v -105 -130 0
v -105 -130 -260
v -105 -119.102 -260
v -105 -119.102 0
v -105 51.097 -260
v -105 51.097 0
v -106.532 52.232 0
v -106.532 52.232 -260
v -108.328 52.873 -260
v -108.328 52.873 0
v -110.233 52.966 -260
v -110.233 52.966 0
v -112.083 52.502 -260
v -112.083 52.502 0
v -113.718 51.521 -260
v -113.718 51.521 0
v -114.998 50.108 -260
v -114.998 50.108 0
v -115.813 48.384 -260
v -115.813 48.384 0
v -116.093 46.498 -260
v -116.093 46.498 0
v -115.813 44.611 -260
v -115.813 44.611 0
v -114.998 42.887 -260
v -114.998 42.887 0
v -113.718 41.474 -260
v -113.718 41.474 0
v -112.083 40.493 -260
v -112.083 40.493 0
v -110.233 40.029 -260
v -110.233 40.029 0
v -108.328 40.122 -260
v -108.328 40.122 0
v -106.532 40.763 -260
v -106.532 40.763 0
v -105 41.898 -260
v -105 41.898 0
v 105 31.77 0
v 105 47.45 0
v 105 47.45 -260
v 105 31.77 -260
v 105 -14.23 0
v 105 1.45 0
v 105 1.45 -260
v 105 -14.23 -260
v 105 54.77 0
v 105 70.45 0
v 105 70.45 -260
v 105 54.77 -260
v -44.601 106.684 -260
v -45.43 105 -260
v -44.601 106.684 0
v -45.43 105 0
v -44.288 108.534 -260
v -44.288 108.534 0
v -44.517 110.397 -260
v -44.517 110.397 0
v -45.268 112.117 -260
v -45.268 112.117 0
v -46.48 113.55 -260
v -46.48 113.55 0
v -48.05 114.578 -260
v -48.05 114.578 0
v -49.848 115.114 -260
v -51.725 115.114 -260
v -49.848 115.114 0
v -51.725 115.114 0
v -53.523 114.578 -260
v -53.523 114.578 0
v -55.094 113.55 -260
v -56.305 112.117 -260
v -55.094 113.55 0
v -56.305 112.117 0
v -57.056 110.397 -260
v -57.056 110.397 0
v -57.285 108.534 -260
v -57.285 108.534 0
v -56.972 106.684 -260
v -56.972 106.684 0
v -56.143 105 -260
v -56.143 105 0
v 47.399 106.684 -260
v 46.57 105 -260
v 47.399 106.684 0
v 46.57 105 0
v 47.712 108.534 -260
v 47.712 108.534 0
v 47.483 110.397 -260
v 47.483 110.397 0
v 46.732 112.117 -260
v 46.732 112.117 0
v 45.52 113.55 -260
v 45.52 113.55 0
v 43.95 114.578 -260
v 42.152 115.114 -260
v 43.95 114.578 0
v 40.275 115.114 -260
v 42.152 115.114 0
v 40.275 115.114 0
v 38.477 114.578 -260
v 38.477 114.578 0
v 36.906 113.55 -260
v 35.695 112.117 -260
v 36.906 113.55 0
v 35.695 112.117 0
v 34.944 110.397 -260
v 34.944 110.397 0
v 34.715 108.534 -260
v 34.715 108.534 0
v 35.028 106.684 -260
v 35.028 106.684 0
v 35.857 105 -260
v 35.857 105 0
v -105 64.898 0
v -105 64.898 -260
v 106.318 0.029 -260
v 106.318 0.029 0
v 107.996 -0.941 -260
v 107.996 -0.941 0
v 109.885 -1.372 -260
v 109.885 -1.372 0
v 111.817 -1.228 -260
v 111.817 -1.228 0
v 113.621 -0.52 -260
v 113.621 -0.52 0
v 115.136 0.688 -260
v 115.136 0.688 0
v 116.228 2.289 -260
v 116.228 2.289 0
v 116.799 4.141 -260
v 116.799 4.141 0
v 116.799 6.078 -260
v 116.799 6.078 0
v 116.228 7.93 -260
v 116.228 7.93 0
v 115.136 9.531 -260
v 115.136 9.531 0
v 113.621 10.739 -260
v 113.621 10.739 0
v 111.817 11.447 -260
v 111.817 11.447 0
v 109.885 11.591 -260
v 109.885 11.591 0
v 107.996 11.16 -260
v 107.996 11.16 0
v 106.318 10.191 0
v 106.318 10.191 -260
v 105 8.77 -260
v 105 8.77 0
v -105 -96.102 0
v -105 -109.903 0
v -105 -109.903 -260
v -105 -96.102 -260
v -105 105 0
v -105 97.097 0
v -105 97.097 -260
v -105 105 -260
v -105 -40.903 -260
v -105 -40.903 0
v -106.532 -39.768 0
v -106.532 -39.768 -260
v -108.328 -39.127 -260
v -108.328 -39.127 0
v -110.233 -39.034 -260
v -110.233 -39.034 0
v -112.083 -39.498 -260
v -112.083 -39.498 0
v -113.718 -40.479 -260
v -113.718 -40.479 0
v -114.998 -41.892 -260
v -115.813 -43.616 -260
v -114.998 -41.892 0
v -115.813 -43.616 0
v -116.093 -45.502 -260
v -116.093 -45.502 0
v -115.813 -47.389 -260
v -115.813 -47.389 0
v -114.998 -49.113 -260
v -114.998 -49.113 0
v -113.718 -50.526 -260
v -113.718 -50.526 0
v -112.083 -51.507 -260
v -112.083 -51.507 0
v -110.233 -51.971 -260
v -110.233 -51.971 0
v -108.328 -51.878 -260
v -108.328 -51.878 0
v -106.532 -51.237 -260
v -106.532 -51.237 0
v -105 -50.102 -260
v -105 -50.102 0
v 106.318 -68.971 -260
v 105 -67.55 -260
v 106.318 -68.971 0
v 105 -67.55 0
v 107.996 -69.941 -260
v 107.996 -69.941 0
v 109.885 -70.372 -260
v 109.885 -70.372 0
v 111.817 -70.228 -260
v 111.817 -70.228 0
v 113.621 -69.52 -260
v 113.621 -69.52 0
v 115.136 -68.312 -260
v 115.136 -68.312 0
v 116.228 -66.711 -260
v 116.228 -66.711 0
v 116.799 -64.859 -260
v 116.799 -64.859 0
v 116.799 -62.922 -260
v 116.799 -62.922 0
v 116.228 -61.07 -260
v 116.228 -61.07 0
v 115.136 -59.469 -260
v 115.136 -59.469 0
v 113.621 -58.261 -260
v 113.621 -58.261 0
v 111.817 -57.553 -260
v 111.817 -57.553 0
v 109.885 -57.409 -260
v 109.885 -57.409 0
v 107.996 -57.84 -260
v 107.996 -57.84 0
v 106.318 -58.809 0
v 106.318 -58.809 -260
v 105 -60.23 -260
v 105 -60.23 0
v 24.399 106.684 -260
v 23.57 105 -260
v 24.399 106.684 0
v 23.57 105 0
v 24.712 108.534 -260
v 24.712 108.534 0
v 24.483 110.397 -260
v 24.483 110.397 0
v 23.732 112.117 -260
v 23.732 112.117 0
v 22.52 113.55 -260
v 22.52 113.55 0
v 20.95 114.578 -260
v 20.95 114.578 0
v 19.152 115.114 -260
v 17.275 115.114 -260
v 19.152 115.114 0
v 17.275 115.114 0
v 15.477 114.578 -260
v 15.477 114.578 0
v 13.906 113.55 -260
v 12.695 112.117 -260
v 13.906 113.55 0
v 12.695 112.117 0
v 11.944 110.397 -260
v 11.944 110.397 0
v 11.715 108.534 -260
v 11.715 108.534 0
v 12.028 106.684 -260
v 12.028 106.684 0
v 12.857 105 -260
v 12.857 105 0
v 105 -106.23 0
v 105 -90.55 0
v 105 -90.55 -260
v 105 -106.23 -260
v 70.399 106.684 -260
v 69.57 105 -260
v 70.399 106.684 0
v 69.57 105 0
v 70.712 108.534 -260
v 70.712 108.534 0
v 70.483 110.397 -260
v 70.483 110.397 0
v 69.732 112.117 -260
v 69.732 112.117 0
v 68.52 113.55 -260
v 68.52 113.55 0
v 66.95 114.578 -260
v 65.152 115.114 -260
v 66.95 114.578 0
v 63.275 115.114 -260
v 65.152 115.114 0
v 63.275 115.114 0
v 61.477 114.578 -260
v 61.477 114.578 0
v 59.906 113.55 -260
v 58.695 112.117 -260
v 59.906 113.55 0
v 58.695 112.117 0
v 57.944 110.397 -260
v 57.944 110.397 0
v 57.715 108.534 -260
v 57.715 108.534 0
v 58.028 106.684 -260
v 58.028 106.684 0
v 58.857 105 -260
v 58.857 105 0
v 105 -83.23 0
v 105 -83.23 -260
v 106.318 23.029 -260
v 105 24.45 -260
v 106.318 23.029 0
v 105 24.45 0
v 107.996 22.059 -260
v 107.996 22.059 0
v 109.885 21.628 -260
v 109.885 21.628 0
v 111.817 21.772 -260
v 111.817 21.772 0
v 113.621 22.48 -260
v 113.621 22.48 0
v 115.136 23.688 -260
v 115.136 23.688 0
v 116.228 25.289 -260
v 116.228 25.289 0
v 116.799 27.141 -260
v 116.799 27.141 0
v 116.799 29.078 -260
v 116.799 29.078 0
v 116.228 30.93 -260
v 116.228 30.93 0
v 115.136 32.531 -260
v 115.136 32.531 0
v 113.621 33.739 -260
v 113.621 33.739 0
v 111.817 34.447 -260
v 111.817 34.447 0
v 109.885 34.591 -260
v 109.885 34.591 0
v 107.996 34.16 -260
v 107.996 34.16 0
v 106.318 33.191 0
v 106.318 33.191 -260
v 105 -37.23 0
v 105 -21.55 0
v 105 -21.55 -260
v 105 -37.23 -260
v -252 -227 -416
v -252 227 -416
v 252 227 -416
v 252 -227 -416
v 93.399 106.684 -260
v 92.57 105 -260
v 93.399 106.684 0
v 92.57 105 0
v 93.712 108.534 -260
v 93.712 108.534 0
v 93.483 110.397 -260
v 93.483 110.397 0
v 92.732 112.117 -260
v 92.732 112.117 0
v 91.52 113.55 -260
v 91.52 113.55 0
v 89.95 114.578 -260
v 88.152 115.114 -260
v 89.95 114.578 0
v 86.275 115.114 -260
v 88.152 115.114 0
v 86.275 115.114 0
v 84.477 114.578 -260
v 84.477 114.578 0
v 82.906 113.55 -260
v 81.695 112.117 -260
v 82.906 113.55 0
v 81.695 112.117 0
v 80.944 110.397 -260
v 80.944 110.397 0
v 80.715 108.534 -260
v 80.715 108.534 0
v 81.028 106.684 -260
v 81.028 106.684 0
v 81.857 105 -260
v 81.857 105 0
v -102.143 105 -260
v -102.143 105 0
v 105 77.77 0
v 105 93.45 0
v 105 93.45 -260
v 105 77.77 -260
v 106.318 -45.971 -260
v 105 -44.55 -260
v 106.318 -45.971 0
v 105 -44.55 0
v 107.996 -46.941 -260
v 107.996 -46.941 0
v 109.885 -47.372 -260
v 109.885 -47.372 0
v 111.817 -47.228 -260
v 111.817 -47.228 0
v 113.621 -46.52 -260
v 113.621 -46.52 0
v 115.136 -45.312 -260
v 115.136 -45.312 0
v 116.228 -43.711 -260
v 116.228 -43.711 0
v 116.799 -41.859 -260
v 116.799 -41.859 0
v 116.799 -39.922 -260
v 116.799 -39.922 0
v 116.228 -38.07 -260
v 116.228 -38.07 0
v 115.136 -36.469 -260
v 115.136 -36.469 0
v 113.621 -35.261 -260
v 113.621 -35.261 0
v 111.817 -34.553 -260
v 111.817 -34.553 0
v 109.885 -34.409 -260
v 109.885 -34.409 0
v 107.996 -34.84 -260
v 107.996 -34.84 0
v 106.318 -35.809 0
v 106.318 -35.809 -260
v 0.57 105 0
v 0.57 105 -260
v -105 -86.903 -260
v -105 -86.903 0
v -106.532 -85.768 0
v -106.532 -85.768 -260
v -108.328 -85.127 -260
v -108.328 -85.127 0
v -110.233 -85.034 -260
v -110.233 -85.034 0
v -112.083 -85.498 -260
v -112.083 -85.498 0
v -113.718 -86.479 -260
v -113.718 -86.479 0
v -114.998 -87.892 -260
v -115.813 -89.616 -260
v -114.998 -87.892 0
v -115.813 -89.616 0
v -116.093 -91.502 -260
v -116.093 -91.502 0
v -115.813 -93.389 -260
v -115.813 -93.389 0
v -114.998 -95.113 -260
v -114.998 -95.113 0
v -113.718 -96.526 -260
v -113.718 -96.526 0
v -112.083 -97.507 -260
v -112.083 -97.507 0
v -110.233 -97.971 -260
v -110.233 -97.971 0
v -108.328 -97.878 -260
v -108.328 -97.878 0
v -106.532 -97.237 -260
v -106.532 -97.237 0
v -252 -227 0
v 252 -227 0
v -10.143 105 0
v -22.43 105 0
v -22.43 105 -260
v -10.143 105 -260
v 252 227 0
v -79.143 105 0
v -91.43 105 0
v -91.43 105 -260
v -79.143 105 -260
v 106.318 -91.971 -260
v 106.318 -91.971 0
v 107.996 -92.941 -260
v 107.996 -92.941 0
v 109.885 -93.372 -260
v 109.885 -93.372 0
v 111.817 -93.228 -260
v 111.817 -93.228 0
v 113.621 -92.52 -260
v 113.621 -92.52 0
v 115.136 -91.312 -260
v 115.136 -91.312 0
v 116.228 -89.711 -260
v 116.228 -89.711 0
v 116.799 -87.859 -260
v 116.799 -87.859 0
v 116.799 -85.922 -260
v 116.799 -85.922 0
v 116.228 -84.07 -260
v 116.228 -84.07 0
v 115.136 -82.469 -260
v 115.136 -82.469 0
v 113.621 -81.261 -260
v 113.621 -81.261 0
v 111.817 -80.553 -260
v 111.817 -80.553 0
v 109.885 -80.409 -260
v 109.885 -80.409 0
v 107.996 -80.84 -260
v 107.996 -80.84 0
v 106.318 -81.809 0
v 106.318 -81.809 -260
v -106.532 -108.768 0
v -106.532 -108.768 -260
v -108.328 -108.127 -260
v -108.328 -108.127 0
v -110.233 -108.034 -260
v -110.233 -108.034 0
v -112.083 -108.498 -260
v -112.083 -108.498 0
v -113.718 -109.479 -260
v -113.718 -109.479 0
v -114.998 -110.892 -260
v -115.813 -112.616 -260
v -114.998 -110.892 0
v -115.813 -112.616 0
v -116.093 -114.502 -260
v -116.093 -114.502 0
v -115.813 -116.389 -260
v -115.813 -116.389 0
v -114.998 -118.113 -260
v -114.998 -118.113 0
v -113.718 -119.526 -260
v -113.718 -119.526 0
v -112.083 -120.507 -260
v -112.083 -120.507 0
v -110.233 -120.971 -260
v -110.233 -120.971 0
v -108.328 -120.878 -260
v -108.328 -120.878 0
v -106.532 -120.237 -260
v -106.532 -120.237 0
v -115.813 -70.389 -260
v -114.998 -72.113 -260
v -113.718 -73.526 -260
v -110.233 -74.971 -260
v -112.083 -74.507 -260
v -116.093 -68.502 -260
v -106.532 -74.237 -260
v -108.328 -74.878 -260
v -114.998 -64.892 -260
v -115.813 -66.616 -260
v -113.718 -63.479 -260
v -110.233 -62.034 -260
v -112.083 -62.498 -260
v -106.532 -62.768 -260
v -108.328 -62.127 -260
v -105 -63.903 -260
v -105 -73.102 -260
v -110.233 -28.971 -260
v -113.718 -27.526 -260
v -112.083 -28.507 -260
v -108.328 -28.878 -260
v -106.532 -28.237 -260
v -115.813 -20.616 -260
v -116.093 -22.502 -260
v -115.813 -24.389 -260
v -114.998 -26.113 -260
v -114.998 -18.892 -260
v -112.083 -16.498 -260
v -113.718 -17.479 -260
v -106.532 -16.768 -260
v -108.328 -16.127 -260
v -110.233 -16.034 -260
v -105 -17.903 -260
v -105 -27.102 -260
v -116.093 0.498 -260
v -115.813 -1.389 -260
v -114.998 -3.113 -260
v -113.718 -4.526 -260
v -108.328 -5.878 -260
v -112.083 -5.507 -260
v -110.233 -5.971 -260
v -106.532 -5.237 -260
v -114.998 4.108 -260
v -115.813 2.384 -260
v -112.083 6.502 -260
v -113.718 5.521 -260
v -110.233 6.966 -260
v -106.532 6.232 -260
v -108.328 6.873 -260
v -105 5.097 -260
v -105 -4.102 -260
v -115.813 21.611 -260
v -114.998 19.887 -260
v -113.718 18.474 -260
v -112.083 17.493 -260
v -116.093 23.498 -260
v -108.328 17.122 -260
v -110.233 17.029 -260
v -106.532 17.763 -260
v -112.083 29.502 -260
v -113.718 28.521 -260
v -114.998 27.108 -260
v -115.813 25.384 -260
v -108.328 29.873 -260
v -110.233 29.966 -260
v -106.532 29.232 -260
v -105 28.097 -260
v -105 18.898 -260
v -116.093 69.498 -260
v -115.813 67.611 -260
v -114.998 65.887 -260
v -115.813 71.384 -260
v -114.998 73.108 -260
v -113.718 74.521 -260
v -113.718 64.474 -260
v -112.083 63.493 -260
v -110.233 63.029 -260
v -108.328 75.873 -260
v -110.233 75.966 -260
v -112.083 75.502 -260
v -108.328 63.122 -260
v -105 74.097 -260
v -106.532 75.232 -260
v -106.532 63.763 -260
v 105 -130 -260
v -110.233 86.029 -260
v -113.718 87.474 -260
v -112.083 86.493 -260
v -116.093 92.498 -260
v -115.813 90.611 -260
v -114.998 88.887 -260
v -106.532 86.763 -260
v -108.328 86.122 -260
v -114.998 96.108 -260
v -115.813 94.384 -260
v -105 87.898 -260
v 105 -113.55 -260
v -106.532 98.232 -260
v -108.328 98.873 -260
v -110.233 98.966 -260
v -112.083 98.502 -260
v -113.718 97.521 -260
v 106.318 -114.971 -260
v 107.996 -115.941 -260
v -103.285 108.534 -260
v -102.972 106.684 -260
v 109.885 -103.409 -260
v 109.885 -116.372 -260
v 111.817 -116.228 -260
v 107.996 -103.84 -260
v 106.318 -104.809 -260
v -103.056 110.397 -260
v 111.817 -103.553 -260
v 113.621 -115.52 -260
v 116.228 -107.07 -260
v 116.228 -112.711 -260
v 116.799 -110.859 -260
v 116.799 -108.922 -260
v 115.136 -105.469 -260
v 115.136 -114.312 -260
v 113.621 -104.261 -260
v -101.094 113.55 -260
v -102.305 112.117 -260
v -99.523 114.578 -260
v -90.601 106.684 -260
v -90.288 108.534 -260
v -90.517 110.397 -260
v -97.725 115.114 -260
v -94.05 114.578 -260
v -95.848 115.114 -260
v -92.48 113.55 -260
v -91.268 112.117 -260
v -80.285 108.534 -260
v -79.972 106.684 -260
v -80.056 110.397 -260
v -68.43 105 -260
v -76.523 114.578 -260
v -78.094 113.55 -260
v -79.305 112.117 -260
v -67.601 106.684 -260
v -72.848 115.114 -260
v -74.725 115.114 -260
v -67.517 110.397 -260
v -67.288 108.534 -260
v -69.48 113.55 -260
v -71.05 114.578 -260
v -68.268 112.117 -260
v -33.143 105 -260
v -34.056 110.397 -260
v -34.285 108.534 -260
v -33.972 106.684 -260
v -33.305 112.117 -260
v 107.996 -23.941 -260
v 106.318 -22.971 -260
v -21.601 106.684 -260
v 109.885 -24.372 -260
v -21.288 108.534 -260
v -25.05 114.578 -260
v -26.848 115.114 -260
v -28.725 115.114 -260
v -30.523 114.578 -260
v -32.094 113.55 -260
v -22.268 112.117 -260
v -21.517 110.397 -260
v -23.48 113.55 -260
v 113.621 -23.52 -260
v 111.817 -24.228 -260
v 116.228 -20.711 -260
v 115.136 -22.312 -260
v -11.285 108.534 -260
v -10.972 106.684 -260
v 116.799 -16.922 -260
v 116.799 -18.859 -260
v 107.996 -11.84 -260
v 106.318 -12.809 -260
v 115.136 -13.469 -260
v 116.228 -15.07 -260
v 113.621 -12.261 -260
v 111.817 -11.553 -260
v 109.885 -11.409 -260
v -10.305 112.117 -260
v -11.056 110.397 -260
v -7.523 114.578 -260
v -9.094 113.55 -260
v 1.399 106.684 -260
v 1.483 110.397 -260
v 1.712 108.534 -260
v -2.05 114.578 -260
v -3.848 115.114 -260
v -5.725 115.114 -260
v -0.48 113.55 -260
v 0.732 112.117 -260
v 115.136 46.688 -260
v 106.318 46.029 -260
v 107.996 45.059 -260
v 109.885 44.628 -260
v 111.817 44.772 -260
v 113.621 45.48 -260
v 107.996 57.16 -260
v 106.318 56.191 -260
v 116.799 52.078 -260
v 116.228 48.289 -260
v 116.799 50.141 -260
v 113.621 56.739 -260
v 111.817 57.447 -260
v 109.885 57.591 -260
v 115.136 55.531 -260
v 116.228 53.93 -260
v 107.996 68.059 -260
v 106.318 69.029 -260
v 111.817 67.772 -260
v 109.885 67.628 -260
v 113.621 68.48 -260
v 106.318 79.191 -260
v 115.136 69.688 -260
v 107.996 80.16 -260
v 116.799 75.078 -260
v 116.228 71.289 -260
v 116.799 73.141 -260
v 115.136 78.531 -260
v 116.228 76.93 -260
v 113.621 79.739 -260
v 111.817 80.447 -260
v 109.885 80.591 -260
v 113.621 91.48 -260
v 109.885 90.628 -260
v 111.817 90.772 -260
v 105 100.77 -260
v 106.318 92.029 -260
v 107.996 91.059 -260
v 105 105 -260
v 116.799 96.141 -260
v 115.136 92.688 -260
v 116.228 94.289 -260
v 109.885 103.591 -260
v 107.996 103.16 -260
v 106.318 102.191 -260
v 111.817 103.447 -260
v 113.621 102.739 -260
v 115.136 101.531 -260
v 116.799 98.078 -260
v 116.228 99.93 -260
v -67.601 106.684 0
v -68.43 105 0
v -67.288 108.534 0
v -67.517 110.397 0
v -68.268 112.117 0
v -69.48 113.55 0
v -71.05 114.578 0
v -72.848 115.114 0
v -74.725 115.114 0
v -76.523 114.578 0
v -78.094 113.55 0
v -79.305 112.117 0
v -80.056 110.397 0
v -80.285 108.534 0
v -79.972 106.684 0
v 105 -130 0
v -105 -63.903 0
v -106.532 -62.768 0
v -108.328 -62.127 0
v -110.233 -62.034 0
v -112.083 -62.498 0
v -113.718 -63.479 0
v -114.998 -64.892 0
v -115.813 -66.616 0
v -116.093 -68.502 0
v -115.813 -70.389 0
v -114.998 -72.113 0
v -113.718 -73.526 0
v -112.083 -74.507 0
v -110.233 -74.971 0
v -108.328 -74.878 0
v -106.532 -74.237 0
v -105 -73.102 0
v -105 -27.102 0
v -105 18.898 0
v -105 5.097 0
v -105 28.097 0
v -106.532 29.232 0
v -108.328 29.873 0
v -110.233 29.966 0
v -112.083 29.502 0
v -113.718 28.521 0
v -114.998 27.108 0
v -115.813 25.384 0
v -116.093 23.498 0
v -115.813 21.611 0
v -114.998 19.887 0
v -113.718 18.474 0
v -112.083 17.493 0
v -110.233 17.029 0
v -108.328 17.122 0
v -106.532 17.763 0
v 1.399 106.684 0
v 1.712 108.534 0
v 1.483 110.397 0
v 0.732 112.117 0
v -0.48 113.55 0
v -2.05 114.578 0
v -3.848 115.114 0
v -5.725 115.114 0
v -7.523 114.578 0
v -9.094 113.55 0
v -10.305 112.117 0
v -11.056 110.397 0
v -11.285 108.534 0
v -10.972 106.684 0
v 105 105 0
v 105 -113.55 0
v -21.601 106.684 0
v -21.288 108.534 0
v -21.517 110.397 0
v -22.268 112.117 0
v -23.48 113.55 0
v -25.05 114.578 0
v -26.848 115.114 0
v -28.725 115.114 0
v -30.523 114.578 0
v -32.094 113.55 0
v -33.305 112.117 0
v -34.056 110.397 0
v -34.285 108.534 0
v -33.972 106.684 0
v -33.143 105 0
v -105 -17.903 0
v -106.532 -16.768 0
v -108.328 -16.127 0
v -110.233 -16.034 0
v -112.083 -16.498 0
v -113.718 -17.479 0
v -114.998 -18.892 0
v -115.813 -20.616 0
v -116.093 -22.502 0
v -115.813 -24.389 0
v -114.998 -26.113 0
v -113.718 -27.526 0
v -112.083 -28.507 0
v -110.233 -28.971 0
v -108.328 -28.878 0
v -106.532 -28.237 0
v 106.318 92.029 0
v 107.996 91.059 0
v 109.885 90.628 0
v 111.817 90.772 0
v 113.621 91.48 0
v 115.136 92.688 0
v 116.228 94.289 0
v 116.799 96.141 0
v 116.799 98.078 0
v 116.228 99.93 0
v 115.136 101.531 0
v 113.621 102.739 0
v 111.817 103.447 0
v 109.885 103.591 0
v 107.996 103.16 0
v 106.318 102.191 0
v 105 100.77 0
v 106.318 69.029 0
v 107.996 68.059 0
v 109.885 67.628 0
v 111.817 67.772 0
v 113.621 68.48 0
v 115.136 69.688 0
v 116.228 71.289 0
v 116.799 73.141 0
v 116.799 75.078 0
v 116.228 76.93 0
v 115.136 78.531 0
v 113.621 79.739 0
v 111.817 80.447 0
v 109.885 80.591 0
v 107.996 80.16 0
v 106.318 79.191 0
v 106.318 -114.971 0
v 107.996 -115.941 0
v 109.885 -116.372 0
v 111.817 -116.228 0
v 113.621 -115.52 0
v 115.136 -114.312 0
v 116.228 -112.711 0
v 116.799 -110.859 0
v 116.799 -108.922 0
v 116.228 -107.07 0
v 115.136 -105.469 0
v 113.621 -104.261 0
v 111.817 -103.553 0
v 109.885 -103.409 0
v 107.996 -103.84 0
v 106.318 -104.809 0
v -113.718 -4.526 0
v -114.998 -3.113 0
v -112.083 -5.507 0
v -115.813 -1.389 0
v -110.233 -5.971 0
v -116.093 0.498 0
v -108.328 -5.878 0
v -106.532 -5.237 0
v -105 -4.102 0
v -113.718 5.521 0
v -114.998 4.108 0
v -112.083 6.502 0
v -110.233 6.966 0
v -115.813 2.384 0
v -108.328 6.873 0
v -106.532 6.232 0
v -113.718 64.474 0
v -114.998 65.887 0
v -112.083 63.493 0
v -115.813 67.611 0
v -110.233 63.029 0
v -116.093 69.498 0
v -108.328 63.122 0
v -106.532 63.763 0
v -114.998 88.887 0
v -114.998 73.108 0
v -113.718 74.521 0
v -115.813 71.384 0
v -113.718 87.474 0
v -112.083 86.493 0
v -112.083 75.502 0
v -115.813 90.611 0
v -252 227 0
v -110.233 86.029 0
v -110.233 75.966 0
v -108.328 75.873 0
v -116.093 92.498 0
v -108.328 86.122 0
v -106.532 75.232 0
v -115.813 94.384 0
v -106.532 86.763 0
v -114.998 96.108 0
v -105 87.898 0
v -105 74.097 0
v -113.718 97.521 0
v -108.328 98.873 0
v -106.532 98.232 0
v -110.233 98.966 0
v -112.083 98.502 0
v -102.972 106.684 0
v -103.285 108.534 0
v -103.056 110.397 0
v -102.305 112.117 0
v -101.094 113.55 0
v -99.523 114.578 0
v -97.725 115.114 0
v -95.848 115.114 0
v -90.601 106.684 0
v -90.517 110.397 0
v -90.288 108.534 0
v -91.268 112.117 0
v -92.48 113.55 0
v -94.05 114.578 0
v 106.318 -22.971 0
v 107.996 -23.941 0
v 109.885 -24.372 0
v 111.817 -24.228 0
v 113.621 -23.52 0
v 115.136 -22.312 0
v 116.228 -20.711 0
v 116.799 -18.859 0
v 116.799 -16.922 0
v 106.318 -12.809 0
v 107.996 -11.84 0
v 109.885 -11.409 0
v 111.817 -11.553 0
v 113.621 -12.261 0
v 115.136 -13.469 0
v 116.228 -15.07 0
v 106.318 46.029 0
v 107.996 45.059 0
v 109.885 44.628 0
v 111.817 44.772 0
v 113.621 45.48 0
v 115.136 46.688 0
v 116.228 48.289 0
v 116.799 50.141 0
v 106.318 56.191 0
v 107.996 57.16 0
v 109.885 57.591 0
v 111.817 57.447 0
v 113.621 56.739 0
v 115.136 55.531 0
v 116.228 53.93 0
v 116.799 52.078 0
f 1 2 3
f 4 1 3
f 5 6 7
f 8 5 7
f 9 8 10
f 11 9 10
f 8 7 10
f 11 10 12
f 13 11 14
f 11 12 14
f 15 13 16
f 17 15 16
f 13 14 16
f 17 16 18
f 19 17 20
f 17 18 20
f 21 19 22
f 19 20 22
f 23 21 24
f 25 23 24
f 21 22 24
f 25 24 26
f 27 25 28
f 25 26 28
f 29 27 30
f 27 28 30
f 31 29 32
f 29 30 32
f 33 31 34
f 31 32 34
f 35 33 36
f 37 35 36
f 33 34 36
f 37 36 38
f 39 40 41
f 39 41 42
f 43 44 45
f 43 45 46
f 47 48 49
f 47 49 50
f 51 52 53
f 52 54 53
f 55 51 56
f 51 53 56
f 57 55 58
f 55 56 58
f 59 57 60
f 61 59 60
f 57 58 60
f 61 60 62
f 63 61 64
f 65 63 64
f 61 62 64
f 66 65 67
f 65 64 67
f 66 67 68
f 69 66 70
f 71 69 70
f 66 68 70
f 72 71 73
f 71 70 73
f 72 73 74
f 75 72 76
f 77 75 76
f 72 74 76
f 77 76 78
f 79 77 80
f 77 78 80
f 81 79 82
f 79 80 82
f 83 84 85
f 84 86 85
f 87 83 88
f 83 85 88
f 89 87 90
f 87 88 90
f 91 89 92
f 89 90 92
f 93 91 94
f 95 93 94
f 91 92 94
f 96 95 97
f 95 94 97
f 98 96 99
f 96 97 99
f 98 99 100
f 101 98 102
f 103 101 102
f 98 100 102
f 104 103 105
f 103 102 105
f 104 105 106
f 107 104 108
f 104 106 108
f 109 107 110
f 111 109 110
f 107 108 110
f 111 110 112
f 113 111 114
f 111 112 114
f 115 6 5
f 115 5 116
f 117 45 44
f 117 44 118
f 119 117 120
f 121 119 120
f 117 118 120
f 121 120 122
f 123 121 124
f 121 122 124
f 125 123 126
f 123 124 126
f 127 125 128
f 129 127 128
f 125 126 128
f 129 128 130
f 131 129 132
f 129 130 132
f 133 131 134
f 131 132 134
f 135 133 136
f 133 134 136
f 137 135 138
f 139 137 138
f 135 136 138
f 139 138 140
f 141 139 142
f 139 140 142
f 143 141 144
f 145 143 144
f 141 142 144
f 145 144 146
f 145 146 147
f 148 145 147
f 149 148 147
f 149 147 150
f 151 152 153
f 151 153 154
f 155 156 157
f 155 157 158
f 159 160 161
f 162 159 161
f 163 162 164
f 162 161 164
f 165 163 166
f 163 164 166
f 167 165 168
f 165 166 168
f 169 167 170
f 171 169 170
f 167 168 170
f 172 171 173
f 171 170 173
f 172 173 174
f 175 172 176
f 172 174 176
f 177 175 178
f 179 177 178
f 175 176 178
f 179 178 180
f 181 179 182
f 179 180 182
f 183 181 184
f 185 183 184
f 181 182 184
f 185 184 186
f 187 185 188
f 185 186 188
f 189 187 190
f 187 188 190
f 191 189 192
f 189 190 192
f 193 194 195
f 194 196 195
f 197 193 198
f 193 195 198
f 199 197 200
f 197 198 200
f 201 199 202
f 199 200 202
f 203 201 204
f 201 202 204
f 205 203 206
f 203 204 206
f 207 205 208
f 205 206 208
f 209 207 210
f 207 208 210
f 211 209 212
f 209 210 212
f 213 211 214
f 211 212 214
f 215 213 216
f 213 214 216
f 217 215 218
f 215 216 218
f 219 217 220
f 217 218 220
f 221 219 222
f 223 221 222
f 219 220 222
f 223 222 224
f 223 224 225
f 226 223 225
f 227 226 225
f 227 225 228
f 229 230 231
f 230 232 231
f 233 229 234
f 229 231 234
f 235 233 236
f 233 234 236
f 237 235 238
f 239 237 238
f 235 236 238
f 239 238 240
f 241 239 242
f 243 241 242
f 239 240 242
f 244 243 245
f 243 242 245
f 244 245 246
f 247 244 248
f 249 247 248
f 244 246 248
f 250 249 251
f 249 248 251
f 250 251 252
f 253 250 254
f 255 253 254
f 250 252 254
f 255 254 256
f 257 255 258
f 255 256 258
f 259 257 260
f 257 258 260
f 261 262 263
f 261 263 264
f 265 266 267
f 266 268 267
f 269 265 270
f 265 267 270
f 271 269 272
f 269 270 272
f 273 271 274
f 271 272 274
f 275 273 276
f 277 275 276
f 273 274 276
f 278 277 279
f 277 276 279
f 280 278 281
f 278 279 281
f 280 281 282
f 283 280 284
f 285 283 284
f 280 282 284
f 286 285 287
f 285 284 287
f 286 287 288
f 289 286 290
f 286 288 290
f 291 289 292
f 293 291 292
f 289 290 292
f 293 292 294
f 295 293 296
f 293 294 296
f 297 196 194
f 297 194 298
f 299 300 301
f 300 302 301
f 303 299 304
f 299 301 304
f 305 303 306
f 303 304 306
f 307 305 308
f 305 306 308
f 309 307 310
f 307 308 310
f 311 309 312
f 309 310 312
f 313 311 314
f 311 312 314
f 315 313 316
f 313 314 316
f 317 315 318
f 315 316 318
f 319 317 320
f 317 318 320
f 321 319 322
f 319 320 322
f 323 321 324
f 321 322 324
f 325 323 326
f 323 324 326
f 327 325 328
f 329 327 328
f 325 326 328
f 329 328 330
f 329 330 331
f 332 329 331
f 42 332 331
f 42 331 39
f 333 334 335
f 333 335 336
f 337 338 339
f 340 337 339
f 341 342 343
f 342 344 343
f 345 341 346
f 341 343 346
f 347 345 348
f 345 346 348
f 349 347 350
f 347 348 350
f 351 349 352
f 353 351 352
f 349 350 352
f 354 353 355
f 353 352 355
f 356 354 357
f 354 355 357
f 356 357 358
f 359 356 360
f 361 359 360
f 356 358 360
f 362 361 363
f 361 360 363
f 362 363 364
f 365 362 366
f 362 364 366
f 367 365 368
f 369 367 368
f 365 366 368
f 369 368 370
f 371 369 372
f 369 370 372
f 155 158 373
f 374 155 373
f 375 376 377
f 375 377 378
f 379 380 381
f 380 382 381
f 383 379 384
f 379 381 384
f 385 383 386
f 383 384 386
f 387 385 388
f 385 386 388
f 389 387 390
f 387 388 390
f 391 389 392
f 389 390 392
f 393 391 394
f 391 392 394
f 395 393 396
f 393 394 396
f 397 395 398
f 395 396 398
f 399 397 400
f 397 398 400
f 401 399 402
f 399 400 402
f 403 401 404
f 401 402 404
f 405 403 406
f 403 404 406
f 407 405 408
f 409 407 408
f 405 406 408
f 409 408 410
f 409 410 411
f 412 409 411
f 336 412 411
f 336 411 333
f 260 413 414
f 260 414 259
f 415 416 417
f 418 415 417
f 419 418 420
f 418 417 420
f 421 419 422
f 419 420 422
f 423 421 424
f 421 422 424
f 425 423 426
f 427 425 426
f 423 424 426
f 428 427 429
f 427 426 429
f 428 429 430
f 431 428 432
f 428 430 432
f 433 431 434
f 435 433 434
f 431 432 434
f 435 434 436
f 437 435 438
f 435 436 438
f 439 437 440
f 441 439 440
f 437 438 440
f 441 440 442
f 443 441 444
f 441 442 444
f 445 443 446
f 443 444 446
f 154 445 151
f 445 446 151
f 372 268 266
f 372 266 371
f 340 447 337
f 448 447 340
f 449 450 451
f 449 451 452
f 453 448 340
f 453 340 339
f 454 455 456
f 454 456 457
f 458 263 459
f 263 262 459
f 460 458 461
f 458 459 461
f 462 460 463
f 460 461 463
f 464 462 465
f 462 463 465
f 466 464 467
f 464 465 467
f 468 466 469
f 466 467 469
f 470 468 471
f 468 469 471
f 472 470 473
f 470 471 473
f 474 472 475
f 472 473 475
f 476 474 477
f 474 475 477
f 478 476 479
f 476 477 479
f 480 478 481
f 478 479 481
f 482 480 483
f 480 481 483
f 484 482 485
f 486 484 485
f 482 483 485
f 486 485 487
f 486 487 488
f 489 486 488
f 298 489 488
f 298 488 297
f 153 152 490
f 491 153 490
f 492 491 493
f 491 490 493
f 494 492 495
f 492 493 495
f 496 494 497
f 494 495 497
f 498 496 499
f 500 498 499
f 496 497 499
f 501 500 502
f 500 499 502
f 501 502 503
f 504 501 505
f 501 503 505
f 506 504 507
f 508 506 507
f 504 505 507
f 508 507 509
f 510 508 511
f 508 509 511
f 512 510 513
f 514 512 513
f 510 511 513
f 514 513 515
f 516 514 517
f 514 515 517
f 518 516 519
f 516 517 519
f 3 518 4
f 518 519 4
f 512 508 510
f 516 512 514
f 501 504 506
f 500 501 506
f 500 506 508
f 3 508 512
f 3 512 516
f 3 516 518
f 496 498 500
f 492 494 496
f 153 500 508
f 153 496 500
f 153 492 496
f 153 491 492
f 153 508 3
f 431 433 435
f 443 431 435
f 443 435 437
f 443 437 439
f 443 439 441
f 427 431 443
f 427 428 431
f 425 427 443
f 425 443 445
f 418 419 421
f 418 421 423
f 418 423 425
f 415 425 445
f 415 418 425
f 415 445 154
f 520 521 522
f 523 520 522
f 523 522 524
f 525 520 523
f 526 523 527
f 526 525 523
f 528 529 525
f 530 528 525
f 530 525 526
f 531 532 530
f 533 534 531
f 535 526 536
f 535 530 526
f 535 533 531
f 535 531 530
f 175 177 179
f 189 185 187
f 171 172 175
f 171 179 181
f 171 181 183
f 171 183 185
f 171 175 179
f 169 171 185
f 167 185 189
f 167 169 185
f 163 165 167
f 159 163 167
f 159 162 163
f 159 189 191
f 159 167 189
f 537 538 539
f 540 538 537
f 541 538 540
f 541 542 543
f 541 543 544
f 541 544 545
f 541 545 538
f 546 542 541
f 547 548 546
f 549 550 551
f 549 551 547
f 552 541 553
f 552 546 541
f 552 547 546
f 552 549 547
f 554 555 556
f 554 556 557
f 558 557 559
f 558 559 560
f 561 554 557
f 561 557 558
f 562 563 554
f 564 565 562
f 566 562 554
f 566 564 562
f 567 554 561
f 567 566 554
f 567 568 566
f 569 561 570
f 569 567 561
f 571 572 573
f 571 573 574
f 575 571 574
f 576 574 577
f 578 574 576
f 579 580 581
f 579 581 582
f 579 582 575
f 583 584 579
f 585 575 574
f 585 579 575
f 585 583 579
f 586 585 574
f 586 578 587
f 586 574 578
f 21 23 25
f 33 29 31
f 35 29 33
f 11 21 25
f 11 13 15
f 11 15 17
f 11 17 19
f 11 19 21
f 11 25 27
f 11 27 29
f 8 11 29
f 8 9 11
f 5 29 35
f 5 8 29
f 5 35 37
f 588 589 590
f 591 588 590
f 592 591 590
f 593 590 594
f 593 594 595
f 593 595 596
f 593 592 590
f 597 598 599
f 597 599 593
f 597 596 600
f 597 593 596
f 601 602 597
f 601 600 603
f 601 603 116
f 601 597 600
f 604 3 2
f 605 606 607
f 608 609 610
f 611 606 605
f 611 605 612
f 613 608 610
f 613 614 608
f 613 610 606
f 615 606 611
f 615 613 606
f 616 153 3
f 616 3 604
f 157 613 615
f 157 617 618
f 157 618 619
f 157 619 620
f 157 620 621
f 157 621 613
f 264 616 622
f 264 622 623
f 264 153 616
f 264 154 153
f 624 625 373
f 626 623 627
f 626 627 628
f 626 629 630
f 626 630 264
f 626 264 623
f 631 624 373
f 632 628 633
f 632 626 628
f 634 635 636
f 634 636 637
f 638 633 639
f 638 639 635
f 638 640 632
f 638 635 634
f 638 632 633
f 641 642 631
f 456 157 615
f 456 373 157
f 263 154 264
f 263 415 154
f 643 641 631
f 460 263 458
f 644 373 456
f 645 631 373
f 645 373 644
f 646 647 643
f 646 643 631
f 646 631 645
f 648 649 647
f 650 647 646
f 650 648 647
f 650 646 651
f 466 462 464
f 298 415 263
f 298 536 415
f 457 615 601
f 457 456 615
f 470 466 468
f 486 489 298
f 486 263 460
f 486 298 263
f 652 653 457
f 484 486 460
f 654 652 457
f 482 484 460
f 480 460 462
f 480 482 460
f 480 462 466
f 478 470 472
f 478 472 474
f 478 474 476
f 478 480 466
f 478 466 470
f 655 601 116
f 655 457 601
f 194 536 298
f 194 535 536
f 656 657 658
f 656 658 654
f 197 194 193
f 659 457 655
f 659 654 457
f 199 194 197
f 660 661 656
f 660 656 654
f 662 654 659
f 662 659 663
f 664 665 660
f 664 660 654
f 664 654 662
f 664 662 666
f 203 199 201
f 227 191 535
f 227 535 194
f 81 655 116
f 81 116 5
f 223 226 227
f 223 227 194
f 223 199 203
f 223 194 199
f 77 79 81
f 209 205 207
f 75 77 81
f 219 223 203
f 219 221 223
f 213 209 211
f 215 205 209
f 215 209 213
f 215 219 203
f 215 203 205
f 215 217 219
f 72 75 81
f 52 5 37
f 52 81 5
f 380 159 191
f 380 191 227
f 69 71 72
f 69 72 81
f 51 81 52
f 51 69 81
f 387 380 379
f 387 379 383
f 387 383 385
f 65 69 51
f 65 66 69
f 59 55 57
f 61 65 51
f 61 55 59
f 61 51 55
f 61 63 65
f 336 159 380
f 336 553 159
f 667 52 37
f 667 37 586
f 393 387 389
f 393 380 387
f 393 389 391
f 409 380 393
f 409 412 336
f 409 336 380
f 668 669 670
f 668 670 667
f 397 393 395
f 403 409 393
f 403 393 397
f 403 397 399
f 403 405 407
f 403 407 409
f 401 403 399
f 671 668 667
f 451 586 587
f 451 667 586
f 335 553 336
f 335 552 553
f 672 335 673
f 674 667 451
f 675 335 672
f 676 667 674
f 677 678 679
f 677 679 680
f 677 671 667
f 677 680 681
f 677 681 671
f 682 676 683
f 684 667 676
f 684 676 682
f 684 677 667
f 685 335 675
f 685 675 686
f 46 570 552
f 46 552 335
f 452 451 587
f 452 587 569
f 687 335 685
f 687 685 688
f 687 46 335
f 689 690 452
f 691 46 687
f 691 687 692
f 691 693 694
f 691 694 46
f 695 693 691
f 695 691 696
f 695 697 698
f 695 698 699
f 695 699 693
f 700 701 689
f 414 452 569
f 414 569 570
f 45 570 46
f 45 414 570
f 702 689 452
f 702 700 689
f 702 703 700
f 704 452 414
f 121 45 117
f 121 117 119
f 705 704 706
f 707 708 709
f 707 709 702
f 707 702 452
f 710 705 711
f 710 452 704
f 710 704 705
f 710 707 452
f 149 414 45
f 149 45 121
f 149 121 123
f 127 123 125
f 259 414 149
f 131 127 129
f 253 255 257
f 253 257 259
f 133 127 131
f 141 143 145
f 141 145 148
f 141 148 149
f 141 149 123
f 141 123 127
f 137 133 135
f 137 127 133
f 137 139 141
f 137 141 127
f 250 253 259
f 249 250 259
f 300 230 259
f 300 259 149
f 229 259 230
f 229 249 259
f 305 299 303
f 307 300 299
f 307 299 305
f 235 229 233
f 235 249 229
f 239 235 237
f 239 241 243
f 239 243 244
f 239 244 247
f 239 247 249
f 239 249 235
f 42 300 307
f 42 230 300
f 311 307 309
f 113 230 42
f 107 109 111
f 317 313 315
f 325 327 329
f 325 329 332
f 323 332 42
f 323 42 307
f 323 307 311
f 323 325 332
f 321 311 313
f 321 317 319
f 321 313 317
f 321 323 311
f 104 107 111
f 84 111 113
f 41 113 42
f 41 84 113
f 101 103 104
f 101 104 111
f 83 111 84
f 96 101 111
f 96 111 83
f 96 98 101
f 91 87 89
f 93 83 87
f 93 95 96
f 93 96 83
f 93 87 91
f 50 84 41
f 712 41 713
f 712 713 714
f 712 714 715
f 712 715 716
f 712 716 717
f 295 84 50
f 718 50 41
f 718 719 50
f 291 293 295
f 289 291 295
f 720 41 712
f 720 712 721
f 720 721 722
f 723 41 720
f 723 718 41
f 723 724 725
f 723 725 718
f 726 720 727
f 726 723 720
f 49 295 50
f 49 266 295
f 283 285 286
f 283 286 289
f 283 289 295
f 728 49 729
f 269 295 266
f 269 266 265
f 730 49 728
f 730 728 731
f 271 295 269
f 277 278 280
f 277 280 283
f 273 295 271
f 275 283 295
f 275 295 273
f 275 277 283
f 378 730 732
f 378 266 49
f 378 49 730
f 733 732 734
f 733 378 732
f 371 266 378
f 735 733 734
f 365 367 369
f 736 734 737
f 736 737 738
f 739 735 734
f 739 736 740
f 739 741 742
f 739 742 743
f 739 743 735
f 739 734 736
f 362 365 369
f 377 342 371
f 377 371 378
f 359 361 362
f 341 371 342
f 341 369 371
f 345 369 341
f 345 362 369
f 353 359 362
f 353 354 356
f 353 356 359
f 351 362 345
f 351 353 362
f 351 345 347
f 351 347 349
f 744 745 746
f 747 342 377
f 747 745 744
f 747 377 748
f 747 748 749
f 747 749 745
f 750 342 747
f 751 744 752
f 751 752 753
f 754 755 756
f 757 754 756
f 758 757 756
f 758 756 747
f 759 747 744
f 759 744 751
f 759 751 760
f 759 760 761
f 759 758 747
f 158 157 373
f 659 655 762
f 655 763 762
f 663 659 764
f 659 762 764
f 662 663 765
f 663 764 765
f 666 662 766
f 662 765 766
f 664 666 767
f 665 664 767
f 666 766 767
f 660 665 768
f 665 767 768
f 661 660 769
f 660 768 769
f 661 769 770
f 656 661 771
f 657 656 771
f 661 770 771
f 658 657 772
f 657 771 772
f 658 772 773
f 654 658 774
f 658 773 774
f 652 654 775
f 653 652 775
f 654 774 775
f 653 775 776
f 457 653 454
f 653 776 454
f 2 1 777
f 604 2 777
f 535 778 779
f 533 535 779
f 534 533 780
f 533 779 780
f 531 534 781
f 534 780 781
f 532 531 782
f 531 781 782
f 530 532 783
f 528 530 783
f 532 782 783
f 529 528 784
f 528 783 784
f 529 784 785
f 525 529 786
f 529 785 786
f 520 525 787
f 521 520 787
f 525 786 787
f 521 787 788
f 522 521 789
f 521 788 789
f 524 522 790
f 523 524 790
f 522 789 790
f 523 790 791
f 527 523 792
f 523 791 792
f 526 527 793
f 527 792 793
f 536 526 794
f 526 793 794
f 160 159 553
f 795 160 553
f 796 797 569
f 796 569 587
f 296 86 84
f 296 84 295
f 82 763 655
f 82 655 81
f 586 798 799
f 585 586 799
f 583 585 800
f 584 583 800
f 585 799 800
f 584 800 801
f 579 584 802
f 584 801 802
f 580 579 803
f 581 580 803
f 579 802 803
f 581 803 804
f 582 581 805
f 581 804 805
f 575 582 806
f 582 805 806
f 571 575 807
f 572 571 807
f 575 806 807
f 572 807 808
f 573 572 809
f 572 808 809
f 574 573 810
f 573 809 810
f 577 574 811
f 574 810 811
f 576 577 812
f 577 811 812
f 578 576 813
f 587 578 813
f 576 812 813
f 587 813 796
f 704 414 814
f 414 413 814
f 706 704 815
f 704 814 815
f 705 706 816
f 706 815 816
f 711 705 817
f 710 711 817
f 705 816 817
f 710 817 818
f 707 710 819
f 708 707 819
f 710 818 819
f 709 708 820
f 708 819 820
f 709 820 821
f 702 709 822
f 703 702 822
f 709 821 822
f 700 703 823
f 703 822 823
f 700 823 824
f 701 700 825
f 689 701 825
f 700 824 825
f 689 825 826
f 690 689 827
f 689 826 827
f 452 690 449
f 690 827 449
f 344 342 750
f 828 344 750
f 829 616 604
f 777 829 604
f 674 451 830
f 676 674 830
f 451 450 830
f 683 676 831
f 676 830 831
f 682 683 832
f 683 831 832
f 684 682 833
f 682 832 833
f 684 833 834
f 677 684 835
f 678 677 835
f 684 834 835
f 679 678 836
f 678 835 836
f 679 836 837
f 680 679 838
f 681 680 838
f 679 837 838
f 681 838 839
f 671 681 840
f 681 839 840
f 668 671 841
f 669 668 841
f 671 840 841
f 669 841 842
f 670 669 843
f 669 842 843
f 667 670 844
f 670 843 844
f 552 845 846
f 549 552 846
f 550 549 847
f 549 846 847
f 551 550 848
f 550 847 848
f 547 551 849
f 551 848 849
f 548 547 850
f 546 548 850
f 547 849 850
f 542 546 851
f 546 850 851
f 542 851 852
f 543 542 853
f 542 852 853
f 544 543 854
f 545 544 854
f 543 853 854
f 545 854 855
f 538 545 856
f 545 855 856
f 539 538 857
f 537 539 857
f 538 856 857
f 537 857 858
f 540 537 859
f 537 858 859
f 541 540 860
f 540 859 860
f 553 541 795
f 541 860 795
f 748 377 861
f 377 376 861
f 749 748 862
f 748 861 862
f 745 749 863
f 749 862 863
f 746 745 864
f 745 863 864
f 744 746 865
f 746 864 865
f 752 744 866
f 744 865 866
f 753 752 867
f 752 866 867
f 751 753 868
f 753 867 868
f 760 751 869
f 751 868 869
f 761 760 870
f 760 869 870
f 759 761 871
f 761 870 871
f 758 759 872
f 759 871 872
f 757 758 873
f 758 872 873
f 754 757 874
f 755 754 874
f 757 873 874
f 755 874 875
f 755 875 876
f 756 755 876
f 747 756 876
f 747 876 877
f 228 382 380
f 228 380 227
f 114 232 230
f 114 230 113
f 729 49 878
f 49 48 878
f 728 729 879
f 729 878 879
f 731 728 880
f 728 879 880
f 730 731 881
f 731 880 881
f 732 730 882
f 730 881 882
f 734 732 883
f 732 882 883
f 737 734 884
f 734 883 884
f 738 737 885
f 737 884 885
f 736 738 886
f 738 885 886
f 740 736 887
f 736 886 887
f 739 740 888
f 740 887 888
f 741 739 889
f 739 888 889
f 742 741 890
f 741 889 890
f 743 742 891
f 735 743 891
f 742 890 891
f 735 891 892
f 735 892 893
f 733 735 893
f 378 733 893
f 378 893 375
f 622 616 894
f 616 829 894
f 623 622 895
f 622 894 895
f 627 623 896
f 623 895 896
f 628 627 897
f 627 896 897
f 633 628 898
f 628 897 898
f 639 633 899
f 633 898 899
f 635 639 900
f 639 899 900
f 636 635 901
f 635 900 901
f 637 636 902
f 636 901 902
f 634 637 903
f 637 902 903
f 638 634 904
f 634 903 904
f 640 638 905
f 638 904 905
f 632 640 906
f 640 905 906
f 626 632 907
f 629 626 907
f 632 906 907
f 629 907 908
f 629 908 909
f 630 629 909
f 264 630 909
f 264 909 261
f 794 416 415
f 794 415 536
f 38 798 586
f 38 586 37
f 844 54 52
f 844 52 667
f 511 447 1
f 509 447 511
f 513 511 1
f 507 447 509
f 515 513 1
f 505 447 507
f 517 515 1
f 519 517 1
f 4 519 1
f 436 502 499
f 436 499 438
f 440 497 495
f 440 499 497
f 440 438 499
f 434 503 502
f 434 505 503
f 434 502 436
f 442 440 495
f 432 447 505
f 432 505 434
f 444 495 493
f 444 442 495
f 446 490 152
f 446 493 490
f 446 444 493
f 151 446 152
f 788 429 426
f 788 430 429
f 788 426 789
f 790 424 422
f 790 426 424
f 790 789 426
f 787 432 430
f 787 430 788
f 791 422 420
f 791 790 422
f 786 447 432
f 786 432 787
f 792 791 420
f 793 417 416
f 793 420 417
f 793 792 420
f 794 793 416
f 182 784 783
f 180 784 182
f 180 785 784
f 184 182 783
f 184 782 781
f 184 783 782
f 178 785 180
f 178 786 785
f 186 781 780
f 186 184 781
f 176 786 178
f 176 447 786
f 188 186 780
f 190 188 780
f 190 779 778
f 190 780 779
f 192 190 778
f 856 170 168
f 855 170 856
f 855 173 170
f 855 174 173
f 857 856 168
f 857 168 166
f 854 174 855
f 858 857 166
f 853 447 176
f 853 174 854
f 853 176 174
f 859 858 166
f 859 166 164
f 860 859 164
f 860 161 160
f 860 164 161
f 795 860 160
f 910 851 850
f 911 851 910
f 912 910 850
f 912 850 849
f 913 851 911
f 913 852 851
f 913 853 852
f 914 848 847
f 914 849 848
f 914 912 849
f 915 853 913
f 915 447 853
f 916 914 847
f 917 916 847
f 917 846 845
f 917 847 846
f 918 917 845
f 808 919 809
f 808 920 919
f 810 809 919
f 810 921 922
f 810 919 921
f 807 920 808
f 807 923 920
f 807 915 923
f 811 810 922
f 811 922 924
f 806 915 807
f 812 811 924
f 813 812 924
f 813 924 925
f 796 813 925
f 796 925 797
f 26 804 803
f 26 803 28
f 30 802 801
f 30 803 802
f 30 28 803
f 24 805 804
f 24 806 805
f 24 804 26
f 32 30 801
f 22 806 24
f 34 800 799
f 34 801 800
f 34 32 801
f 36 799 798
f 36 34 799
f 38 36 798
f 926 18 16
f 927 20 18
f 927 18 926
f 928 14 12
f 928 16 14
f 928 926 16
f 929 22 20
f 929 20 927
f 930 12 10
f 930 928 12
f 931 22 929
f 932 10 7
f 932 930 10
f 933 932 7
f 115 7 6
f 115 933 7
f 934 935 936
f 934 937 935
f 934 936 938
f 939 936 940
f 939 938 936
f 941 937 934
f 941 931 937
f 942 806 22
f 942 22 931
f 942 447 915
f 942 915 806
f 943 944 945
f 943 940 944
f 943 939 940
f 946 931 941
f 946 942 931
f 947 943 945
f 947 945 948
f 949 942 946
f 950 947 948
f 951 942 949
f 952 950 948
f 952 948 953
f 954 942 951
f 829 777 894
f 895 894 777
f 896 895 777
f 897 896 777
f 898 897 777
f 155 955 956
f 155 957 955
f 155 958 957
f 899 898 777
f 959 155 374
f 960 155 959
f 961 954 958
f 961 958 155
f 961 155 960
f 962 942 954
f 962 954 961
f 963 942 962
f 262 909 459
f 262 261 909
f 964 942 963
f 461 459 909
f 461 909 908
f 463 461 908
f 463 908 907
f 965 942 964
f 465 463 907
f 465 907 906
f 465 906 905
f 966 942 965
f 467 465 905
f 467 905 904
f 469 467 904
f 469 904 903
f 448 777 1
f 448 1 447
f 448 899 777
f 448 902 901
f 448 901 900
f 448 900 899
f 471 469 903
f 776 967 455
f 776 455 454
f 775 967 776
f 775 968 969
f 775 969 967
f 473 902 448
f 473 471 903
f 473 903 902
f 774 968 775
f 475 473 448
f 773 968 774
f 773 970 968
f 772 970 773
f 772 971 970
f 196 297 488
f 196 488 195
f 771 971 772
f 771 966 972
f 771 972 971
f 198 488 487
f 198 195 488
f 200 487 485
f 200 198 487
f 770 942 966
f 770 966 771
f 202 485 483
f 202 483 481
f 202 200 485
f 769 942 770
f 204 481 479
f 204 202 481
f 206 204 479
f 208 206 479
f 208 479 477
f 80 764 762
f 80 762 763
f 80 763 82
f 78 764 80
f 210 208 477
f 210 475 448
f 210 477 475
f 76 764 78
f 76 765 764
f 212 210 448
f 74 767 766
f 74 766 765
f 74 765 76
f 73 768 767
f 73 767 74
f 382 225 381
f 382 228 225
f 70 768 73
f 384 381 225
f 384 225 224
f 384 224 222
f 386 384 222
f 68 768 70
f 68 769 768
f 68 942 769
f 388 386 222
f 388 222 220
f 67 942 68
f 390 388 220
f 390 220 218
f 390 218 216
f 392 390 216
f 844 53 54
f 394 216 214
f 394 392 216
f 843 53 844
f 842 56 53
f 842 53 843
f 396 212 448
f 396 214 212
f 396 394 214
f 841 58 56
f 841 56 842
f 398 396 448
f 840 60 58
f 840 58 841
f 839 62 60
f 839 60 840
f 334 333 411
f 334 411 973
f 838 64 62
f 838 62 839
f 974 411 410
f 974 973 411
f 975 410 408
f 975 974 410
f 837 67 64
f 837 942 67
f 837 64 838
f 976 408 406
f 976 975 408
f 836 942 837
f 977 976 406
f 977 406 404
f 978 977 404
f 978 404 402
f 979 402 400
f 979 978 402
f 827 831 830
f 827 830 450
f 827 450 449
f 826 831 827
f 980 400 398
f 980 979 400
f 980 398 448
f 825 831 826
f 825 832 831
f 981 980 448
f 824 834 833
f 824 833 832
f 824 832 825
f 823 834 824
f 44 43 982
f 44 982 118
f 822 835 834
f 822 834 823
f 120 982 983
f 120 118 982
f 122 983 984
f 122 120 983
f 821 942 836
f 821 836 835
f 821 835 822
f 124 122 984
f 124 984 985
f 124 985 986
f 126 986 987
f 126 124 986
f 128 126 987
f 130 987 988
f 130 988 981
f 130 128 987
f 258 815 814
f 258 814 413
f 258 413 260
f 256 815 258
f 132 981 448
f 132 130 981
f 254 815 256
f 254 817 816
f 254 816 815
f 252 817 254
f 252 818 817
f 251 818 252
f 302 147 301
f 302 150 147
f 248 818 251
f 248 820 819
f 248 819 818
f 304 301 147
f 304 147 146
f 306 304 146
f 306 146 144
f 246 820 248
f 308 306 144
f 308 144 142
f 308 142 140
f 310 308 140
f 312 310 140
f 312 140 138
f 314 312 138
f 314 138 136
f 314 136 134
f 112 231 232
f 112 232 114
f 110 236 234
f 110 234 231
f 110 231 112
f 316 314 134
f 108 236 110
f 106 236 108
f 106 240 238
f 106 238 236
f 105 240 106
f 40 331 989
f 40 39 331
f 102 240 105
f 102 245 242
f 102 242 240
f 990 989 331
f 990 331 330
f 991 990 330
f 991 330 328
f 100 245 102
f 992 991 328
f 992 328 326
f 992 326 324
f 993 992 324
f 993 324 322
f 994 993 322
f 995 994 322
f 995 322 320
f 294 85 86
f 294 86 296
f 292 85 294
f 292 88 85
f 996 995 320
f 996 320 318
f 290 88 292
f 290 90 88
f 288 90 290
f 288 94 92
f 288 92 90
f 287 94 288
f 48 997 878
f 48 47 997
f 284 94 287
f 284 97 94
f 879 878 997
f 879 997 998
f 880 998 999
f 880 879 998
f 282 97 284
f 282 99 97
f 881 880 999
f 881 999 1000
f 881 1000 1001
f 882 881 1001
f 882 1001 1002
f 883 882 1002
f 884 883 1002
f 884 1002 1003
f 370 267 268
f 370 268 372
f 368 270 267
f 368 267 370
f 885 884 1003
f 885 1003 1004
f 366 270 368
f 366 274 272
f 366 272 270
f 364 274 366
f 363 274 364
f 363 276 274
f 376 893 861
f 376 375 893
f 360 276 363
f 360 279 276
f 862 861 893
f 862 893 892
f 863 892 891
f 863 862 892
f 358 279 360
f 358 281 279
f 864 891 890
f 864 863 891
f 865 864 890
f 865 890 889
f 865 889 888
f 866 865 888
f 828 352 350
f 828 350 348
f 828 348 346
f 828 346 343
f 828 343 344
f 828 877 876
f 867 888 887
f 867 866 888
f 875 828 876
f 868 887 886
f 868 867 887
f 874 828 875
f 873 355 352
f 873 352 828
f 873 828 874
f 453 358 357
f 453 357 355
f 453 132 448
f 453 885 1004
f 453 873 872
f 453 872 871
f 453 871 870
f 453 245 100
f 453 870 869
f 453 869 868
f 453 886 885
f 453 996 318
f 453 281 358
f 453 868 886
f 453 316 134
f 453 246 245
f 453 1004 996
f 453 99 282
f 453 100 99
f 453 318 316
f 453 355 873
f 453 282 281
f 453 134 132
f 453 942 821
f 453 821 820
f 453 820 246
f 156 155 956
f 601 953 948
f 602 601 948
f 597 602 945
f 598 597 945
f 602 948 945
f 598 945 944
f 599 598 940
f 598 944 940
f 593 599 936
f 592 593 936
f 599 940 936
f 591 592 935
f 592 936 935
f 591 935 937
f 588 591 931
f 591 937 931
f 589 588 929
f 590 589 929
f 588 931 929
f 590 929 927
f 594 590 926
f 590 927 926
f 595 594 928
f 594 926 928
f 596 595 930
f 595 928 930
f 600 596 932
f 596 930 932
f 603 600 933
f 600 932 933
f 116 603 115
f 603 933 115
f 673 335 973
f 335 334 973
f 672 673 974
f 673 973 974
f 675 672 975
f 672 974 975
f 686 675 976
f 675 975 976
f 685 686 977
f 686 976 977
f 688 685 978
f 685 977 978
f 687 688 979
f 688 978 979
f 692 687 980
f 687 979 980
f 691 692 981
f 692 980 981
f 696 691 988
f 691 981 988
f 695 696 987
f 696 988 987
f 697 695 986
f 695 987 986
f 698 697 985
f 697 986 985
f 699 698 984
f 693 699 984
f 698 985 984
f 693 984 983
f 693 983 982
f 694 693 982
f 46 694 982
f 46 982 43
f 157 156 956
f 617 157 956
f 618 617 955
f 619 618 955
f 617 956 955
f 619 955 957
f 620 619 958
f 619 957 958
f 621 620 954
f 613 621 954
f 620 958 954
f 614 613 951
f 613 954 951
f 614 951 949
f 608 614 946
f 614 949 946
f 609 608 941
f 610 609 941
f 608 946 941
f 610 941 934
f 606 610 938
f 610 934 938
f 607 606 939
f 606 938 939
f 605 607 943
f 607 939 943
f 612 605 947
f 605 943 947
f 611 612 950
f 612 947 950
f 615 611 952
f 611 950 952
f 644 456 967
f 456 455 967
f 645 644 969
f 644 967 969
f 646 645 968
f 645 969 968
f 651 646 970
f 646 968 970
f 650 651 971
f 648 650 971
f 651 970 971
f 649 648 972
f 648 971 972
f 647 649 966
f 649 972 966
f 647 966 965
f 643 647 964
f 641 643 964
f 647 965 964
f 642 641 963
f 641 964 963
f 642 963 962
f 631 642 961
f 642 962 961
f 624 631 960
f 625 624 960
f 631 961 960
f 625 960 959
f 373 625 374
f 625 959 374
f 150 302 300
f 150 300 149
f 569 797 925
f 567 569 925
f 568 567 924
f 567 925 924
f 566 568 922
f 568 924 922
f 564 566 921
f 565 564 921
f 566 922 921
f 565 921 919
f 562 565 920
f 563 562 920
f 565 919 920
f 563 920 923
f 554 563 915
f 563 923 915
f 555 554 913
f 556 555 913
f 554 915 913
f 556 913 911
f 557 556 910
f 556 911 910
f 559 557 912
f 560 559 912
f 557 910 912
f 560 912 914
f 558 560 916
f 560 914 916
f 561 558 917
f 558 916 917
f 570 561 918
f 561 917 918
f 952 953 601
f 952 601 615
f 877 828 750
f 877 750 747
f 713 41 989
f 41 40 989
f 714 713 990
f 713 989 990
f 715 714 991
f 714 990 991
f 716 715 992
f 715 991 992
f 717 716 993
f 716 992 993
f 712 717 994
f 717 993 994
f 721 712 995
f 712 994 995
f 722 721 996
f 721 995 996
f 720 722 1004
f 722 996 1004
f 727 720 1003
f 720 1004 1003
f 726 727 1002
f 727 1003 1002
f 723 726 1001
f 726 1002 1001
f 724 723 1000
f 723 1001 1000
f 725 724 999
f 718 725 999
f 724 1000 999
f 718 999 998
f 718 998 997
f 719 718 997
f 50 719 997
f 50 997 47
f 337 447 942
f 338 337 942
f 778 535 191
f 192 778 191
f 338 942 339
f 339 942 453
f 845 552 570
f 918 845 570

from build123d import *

# Parameters (mm, degrees)
SKETCH1_W           = 504
SKETCH1_H           = 454
BOSS_EXTRUDE1_DEPTH = 416
SKETCH2_W           = 260
SKETCH2_H           = 260
CUT_EXTRUDE1_DEPTH  = 260
BOSS_EXTRUDE2_DEPTH = 260
SKETCH6_R           = 6.5
CUT_EXTRUDE2_DEPTH  = 260
LPATTERN3_COUNT     = 10
LPATTERN3_PITCH     = 23
SKETCH7_R           = 6.5
CUT_EXTRUDE3_DEPTH  = 260
LPATTERN4_COUNT     = 10
LPATTERN4_PITCH     = 23
SKETCH8_R           = 6.5
CUT_EXTRUDE4_DEPTH  = 260
LPATTERN5_COUNT     = 9
LPATTERN5_PITCH     = 23


with BuildPart() as part:
    # Sketch1 → Boss-Extrude1 (new body)
    with BuildSketch(Plane.XY):
        Rectangle(SKETCH1_W, SKETCH1_H)
    extrude(amount=-BOSS_EXTRUDE1_DEPTH)

    # Sketch2 → Cut-Extrude1 (cut)
    with BuildSketch(Plane.XY):
        Rectangle(SKETCH2_W, SKETCH2_H)
    extrude(amount=-CUT_EXTRUDE1_DEPTH, mode=Mode.SUBTRACT)

    # Sketch5 → Boss-Extrude2 (add)
    with BuildSketch(Plane.XY):
        Polygon((-105, 130), (-130, 130), (-130, 105), (-130, -130), (-105, -130), (-105, 105), (105, 105), (105, -130), (130, -130), (130, 105), (130, 130), (105, 130), align=None)
    extrude(amount=-BOSS_EXTRUDE2_DEPTH)

    # Sketch6 → Cut-Extrude2 (cut)
    with BuildSketch(Plane.XY):
        with Locations((-109.593002072, 92.497724269)):
            Circle(SKETCH6_R)
    cut_extrude2 = extrude(amount=-CUT_EXTRUDE2_DEPTH, mode=Mode.SUBTRACT)

    # LPattern3: Cut-Extrude2 ×10
    with Locations(*[(0, -i * LPATTERN3_PITCH, 0) for i in range(1, LPATTERN3_COUNT)]):
        add(cut_extrude2, mode=Mode.SUBTRACT)

    # Sketch7 → Cut-Extrude3 (cut)
    with BuildSketch(Plane.XY):
        with Locations((110.371561269, 97.109609101)):
            Circle(SKETCH7_R)
    cut_extrude3 = extrude(amount=-CUT_EXTRUDE3_DEPTH, mode=Mode.SUBTRACT)

    # LPattern4: Cut-Extrude3 ×10
    with Locations(*[(0, -i * LPATTERN4_PITCH, 0) for i in range(1, LPATTERN4_COUNT)]):
        add(cut_extrude3, mode=Mode.SUBTRACT)

    # Sketch8 → Cut-Extrude4 (cut)
    with BuildSketch(Plane.XY):
        with Locations((-96.786646696, 108.681954404)):
            Circle(SKETCH8_R)
    cut_extrude4 = extrude(amount=-CUT_EXTRUDE4_DEPTH, mode=Mode.SUBTRACT)

    # LPattern5: Cut-Extrude4 ×9
    with Locations(*[(i * LPATTERN5_PITCH, 0, 0) for i in range(1, LPATTERN5_COUNT)]):
        add(cut_extrude4, mode=Mode.SUBTRACT)


solid = part.part
